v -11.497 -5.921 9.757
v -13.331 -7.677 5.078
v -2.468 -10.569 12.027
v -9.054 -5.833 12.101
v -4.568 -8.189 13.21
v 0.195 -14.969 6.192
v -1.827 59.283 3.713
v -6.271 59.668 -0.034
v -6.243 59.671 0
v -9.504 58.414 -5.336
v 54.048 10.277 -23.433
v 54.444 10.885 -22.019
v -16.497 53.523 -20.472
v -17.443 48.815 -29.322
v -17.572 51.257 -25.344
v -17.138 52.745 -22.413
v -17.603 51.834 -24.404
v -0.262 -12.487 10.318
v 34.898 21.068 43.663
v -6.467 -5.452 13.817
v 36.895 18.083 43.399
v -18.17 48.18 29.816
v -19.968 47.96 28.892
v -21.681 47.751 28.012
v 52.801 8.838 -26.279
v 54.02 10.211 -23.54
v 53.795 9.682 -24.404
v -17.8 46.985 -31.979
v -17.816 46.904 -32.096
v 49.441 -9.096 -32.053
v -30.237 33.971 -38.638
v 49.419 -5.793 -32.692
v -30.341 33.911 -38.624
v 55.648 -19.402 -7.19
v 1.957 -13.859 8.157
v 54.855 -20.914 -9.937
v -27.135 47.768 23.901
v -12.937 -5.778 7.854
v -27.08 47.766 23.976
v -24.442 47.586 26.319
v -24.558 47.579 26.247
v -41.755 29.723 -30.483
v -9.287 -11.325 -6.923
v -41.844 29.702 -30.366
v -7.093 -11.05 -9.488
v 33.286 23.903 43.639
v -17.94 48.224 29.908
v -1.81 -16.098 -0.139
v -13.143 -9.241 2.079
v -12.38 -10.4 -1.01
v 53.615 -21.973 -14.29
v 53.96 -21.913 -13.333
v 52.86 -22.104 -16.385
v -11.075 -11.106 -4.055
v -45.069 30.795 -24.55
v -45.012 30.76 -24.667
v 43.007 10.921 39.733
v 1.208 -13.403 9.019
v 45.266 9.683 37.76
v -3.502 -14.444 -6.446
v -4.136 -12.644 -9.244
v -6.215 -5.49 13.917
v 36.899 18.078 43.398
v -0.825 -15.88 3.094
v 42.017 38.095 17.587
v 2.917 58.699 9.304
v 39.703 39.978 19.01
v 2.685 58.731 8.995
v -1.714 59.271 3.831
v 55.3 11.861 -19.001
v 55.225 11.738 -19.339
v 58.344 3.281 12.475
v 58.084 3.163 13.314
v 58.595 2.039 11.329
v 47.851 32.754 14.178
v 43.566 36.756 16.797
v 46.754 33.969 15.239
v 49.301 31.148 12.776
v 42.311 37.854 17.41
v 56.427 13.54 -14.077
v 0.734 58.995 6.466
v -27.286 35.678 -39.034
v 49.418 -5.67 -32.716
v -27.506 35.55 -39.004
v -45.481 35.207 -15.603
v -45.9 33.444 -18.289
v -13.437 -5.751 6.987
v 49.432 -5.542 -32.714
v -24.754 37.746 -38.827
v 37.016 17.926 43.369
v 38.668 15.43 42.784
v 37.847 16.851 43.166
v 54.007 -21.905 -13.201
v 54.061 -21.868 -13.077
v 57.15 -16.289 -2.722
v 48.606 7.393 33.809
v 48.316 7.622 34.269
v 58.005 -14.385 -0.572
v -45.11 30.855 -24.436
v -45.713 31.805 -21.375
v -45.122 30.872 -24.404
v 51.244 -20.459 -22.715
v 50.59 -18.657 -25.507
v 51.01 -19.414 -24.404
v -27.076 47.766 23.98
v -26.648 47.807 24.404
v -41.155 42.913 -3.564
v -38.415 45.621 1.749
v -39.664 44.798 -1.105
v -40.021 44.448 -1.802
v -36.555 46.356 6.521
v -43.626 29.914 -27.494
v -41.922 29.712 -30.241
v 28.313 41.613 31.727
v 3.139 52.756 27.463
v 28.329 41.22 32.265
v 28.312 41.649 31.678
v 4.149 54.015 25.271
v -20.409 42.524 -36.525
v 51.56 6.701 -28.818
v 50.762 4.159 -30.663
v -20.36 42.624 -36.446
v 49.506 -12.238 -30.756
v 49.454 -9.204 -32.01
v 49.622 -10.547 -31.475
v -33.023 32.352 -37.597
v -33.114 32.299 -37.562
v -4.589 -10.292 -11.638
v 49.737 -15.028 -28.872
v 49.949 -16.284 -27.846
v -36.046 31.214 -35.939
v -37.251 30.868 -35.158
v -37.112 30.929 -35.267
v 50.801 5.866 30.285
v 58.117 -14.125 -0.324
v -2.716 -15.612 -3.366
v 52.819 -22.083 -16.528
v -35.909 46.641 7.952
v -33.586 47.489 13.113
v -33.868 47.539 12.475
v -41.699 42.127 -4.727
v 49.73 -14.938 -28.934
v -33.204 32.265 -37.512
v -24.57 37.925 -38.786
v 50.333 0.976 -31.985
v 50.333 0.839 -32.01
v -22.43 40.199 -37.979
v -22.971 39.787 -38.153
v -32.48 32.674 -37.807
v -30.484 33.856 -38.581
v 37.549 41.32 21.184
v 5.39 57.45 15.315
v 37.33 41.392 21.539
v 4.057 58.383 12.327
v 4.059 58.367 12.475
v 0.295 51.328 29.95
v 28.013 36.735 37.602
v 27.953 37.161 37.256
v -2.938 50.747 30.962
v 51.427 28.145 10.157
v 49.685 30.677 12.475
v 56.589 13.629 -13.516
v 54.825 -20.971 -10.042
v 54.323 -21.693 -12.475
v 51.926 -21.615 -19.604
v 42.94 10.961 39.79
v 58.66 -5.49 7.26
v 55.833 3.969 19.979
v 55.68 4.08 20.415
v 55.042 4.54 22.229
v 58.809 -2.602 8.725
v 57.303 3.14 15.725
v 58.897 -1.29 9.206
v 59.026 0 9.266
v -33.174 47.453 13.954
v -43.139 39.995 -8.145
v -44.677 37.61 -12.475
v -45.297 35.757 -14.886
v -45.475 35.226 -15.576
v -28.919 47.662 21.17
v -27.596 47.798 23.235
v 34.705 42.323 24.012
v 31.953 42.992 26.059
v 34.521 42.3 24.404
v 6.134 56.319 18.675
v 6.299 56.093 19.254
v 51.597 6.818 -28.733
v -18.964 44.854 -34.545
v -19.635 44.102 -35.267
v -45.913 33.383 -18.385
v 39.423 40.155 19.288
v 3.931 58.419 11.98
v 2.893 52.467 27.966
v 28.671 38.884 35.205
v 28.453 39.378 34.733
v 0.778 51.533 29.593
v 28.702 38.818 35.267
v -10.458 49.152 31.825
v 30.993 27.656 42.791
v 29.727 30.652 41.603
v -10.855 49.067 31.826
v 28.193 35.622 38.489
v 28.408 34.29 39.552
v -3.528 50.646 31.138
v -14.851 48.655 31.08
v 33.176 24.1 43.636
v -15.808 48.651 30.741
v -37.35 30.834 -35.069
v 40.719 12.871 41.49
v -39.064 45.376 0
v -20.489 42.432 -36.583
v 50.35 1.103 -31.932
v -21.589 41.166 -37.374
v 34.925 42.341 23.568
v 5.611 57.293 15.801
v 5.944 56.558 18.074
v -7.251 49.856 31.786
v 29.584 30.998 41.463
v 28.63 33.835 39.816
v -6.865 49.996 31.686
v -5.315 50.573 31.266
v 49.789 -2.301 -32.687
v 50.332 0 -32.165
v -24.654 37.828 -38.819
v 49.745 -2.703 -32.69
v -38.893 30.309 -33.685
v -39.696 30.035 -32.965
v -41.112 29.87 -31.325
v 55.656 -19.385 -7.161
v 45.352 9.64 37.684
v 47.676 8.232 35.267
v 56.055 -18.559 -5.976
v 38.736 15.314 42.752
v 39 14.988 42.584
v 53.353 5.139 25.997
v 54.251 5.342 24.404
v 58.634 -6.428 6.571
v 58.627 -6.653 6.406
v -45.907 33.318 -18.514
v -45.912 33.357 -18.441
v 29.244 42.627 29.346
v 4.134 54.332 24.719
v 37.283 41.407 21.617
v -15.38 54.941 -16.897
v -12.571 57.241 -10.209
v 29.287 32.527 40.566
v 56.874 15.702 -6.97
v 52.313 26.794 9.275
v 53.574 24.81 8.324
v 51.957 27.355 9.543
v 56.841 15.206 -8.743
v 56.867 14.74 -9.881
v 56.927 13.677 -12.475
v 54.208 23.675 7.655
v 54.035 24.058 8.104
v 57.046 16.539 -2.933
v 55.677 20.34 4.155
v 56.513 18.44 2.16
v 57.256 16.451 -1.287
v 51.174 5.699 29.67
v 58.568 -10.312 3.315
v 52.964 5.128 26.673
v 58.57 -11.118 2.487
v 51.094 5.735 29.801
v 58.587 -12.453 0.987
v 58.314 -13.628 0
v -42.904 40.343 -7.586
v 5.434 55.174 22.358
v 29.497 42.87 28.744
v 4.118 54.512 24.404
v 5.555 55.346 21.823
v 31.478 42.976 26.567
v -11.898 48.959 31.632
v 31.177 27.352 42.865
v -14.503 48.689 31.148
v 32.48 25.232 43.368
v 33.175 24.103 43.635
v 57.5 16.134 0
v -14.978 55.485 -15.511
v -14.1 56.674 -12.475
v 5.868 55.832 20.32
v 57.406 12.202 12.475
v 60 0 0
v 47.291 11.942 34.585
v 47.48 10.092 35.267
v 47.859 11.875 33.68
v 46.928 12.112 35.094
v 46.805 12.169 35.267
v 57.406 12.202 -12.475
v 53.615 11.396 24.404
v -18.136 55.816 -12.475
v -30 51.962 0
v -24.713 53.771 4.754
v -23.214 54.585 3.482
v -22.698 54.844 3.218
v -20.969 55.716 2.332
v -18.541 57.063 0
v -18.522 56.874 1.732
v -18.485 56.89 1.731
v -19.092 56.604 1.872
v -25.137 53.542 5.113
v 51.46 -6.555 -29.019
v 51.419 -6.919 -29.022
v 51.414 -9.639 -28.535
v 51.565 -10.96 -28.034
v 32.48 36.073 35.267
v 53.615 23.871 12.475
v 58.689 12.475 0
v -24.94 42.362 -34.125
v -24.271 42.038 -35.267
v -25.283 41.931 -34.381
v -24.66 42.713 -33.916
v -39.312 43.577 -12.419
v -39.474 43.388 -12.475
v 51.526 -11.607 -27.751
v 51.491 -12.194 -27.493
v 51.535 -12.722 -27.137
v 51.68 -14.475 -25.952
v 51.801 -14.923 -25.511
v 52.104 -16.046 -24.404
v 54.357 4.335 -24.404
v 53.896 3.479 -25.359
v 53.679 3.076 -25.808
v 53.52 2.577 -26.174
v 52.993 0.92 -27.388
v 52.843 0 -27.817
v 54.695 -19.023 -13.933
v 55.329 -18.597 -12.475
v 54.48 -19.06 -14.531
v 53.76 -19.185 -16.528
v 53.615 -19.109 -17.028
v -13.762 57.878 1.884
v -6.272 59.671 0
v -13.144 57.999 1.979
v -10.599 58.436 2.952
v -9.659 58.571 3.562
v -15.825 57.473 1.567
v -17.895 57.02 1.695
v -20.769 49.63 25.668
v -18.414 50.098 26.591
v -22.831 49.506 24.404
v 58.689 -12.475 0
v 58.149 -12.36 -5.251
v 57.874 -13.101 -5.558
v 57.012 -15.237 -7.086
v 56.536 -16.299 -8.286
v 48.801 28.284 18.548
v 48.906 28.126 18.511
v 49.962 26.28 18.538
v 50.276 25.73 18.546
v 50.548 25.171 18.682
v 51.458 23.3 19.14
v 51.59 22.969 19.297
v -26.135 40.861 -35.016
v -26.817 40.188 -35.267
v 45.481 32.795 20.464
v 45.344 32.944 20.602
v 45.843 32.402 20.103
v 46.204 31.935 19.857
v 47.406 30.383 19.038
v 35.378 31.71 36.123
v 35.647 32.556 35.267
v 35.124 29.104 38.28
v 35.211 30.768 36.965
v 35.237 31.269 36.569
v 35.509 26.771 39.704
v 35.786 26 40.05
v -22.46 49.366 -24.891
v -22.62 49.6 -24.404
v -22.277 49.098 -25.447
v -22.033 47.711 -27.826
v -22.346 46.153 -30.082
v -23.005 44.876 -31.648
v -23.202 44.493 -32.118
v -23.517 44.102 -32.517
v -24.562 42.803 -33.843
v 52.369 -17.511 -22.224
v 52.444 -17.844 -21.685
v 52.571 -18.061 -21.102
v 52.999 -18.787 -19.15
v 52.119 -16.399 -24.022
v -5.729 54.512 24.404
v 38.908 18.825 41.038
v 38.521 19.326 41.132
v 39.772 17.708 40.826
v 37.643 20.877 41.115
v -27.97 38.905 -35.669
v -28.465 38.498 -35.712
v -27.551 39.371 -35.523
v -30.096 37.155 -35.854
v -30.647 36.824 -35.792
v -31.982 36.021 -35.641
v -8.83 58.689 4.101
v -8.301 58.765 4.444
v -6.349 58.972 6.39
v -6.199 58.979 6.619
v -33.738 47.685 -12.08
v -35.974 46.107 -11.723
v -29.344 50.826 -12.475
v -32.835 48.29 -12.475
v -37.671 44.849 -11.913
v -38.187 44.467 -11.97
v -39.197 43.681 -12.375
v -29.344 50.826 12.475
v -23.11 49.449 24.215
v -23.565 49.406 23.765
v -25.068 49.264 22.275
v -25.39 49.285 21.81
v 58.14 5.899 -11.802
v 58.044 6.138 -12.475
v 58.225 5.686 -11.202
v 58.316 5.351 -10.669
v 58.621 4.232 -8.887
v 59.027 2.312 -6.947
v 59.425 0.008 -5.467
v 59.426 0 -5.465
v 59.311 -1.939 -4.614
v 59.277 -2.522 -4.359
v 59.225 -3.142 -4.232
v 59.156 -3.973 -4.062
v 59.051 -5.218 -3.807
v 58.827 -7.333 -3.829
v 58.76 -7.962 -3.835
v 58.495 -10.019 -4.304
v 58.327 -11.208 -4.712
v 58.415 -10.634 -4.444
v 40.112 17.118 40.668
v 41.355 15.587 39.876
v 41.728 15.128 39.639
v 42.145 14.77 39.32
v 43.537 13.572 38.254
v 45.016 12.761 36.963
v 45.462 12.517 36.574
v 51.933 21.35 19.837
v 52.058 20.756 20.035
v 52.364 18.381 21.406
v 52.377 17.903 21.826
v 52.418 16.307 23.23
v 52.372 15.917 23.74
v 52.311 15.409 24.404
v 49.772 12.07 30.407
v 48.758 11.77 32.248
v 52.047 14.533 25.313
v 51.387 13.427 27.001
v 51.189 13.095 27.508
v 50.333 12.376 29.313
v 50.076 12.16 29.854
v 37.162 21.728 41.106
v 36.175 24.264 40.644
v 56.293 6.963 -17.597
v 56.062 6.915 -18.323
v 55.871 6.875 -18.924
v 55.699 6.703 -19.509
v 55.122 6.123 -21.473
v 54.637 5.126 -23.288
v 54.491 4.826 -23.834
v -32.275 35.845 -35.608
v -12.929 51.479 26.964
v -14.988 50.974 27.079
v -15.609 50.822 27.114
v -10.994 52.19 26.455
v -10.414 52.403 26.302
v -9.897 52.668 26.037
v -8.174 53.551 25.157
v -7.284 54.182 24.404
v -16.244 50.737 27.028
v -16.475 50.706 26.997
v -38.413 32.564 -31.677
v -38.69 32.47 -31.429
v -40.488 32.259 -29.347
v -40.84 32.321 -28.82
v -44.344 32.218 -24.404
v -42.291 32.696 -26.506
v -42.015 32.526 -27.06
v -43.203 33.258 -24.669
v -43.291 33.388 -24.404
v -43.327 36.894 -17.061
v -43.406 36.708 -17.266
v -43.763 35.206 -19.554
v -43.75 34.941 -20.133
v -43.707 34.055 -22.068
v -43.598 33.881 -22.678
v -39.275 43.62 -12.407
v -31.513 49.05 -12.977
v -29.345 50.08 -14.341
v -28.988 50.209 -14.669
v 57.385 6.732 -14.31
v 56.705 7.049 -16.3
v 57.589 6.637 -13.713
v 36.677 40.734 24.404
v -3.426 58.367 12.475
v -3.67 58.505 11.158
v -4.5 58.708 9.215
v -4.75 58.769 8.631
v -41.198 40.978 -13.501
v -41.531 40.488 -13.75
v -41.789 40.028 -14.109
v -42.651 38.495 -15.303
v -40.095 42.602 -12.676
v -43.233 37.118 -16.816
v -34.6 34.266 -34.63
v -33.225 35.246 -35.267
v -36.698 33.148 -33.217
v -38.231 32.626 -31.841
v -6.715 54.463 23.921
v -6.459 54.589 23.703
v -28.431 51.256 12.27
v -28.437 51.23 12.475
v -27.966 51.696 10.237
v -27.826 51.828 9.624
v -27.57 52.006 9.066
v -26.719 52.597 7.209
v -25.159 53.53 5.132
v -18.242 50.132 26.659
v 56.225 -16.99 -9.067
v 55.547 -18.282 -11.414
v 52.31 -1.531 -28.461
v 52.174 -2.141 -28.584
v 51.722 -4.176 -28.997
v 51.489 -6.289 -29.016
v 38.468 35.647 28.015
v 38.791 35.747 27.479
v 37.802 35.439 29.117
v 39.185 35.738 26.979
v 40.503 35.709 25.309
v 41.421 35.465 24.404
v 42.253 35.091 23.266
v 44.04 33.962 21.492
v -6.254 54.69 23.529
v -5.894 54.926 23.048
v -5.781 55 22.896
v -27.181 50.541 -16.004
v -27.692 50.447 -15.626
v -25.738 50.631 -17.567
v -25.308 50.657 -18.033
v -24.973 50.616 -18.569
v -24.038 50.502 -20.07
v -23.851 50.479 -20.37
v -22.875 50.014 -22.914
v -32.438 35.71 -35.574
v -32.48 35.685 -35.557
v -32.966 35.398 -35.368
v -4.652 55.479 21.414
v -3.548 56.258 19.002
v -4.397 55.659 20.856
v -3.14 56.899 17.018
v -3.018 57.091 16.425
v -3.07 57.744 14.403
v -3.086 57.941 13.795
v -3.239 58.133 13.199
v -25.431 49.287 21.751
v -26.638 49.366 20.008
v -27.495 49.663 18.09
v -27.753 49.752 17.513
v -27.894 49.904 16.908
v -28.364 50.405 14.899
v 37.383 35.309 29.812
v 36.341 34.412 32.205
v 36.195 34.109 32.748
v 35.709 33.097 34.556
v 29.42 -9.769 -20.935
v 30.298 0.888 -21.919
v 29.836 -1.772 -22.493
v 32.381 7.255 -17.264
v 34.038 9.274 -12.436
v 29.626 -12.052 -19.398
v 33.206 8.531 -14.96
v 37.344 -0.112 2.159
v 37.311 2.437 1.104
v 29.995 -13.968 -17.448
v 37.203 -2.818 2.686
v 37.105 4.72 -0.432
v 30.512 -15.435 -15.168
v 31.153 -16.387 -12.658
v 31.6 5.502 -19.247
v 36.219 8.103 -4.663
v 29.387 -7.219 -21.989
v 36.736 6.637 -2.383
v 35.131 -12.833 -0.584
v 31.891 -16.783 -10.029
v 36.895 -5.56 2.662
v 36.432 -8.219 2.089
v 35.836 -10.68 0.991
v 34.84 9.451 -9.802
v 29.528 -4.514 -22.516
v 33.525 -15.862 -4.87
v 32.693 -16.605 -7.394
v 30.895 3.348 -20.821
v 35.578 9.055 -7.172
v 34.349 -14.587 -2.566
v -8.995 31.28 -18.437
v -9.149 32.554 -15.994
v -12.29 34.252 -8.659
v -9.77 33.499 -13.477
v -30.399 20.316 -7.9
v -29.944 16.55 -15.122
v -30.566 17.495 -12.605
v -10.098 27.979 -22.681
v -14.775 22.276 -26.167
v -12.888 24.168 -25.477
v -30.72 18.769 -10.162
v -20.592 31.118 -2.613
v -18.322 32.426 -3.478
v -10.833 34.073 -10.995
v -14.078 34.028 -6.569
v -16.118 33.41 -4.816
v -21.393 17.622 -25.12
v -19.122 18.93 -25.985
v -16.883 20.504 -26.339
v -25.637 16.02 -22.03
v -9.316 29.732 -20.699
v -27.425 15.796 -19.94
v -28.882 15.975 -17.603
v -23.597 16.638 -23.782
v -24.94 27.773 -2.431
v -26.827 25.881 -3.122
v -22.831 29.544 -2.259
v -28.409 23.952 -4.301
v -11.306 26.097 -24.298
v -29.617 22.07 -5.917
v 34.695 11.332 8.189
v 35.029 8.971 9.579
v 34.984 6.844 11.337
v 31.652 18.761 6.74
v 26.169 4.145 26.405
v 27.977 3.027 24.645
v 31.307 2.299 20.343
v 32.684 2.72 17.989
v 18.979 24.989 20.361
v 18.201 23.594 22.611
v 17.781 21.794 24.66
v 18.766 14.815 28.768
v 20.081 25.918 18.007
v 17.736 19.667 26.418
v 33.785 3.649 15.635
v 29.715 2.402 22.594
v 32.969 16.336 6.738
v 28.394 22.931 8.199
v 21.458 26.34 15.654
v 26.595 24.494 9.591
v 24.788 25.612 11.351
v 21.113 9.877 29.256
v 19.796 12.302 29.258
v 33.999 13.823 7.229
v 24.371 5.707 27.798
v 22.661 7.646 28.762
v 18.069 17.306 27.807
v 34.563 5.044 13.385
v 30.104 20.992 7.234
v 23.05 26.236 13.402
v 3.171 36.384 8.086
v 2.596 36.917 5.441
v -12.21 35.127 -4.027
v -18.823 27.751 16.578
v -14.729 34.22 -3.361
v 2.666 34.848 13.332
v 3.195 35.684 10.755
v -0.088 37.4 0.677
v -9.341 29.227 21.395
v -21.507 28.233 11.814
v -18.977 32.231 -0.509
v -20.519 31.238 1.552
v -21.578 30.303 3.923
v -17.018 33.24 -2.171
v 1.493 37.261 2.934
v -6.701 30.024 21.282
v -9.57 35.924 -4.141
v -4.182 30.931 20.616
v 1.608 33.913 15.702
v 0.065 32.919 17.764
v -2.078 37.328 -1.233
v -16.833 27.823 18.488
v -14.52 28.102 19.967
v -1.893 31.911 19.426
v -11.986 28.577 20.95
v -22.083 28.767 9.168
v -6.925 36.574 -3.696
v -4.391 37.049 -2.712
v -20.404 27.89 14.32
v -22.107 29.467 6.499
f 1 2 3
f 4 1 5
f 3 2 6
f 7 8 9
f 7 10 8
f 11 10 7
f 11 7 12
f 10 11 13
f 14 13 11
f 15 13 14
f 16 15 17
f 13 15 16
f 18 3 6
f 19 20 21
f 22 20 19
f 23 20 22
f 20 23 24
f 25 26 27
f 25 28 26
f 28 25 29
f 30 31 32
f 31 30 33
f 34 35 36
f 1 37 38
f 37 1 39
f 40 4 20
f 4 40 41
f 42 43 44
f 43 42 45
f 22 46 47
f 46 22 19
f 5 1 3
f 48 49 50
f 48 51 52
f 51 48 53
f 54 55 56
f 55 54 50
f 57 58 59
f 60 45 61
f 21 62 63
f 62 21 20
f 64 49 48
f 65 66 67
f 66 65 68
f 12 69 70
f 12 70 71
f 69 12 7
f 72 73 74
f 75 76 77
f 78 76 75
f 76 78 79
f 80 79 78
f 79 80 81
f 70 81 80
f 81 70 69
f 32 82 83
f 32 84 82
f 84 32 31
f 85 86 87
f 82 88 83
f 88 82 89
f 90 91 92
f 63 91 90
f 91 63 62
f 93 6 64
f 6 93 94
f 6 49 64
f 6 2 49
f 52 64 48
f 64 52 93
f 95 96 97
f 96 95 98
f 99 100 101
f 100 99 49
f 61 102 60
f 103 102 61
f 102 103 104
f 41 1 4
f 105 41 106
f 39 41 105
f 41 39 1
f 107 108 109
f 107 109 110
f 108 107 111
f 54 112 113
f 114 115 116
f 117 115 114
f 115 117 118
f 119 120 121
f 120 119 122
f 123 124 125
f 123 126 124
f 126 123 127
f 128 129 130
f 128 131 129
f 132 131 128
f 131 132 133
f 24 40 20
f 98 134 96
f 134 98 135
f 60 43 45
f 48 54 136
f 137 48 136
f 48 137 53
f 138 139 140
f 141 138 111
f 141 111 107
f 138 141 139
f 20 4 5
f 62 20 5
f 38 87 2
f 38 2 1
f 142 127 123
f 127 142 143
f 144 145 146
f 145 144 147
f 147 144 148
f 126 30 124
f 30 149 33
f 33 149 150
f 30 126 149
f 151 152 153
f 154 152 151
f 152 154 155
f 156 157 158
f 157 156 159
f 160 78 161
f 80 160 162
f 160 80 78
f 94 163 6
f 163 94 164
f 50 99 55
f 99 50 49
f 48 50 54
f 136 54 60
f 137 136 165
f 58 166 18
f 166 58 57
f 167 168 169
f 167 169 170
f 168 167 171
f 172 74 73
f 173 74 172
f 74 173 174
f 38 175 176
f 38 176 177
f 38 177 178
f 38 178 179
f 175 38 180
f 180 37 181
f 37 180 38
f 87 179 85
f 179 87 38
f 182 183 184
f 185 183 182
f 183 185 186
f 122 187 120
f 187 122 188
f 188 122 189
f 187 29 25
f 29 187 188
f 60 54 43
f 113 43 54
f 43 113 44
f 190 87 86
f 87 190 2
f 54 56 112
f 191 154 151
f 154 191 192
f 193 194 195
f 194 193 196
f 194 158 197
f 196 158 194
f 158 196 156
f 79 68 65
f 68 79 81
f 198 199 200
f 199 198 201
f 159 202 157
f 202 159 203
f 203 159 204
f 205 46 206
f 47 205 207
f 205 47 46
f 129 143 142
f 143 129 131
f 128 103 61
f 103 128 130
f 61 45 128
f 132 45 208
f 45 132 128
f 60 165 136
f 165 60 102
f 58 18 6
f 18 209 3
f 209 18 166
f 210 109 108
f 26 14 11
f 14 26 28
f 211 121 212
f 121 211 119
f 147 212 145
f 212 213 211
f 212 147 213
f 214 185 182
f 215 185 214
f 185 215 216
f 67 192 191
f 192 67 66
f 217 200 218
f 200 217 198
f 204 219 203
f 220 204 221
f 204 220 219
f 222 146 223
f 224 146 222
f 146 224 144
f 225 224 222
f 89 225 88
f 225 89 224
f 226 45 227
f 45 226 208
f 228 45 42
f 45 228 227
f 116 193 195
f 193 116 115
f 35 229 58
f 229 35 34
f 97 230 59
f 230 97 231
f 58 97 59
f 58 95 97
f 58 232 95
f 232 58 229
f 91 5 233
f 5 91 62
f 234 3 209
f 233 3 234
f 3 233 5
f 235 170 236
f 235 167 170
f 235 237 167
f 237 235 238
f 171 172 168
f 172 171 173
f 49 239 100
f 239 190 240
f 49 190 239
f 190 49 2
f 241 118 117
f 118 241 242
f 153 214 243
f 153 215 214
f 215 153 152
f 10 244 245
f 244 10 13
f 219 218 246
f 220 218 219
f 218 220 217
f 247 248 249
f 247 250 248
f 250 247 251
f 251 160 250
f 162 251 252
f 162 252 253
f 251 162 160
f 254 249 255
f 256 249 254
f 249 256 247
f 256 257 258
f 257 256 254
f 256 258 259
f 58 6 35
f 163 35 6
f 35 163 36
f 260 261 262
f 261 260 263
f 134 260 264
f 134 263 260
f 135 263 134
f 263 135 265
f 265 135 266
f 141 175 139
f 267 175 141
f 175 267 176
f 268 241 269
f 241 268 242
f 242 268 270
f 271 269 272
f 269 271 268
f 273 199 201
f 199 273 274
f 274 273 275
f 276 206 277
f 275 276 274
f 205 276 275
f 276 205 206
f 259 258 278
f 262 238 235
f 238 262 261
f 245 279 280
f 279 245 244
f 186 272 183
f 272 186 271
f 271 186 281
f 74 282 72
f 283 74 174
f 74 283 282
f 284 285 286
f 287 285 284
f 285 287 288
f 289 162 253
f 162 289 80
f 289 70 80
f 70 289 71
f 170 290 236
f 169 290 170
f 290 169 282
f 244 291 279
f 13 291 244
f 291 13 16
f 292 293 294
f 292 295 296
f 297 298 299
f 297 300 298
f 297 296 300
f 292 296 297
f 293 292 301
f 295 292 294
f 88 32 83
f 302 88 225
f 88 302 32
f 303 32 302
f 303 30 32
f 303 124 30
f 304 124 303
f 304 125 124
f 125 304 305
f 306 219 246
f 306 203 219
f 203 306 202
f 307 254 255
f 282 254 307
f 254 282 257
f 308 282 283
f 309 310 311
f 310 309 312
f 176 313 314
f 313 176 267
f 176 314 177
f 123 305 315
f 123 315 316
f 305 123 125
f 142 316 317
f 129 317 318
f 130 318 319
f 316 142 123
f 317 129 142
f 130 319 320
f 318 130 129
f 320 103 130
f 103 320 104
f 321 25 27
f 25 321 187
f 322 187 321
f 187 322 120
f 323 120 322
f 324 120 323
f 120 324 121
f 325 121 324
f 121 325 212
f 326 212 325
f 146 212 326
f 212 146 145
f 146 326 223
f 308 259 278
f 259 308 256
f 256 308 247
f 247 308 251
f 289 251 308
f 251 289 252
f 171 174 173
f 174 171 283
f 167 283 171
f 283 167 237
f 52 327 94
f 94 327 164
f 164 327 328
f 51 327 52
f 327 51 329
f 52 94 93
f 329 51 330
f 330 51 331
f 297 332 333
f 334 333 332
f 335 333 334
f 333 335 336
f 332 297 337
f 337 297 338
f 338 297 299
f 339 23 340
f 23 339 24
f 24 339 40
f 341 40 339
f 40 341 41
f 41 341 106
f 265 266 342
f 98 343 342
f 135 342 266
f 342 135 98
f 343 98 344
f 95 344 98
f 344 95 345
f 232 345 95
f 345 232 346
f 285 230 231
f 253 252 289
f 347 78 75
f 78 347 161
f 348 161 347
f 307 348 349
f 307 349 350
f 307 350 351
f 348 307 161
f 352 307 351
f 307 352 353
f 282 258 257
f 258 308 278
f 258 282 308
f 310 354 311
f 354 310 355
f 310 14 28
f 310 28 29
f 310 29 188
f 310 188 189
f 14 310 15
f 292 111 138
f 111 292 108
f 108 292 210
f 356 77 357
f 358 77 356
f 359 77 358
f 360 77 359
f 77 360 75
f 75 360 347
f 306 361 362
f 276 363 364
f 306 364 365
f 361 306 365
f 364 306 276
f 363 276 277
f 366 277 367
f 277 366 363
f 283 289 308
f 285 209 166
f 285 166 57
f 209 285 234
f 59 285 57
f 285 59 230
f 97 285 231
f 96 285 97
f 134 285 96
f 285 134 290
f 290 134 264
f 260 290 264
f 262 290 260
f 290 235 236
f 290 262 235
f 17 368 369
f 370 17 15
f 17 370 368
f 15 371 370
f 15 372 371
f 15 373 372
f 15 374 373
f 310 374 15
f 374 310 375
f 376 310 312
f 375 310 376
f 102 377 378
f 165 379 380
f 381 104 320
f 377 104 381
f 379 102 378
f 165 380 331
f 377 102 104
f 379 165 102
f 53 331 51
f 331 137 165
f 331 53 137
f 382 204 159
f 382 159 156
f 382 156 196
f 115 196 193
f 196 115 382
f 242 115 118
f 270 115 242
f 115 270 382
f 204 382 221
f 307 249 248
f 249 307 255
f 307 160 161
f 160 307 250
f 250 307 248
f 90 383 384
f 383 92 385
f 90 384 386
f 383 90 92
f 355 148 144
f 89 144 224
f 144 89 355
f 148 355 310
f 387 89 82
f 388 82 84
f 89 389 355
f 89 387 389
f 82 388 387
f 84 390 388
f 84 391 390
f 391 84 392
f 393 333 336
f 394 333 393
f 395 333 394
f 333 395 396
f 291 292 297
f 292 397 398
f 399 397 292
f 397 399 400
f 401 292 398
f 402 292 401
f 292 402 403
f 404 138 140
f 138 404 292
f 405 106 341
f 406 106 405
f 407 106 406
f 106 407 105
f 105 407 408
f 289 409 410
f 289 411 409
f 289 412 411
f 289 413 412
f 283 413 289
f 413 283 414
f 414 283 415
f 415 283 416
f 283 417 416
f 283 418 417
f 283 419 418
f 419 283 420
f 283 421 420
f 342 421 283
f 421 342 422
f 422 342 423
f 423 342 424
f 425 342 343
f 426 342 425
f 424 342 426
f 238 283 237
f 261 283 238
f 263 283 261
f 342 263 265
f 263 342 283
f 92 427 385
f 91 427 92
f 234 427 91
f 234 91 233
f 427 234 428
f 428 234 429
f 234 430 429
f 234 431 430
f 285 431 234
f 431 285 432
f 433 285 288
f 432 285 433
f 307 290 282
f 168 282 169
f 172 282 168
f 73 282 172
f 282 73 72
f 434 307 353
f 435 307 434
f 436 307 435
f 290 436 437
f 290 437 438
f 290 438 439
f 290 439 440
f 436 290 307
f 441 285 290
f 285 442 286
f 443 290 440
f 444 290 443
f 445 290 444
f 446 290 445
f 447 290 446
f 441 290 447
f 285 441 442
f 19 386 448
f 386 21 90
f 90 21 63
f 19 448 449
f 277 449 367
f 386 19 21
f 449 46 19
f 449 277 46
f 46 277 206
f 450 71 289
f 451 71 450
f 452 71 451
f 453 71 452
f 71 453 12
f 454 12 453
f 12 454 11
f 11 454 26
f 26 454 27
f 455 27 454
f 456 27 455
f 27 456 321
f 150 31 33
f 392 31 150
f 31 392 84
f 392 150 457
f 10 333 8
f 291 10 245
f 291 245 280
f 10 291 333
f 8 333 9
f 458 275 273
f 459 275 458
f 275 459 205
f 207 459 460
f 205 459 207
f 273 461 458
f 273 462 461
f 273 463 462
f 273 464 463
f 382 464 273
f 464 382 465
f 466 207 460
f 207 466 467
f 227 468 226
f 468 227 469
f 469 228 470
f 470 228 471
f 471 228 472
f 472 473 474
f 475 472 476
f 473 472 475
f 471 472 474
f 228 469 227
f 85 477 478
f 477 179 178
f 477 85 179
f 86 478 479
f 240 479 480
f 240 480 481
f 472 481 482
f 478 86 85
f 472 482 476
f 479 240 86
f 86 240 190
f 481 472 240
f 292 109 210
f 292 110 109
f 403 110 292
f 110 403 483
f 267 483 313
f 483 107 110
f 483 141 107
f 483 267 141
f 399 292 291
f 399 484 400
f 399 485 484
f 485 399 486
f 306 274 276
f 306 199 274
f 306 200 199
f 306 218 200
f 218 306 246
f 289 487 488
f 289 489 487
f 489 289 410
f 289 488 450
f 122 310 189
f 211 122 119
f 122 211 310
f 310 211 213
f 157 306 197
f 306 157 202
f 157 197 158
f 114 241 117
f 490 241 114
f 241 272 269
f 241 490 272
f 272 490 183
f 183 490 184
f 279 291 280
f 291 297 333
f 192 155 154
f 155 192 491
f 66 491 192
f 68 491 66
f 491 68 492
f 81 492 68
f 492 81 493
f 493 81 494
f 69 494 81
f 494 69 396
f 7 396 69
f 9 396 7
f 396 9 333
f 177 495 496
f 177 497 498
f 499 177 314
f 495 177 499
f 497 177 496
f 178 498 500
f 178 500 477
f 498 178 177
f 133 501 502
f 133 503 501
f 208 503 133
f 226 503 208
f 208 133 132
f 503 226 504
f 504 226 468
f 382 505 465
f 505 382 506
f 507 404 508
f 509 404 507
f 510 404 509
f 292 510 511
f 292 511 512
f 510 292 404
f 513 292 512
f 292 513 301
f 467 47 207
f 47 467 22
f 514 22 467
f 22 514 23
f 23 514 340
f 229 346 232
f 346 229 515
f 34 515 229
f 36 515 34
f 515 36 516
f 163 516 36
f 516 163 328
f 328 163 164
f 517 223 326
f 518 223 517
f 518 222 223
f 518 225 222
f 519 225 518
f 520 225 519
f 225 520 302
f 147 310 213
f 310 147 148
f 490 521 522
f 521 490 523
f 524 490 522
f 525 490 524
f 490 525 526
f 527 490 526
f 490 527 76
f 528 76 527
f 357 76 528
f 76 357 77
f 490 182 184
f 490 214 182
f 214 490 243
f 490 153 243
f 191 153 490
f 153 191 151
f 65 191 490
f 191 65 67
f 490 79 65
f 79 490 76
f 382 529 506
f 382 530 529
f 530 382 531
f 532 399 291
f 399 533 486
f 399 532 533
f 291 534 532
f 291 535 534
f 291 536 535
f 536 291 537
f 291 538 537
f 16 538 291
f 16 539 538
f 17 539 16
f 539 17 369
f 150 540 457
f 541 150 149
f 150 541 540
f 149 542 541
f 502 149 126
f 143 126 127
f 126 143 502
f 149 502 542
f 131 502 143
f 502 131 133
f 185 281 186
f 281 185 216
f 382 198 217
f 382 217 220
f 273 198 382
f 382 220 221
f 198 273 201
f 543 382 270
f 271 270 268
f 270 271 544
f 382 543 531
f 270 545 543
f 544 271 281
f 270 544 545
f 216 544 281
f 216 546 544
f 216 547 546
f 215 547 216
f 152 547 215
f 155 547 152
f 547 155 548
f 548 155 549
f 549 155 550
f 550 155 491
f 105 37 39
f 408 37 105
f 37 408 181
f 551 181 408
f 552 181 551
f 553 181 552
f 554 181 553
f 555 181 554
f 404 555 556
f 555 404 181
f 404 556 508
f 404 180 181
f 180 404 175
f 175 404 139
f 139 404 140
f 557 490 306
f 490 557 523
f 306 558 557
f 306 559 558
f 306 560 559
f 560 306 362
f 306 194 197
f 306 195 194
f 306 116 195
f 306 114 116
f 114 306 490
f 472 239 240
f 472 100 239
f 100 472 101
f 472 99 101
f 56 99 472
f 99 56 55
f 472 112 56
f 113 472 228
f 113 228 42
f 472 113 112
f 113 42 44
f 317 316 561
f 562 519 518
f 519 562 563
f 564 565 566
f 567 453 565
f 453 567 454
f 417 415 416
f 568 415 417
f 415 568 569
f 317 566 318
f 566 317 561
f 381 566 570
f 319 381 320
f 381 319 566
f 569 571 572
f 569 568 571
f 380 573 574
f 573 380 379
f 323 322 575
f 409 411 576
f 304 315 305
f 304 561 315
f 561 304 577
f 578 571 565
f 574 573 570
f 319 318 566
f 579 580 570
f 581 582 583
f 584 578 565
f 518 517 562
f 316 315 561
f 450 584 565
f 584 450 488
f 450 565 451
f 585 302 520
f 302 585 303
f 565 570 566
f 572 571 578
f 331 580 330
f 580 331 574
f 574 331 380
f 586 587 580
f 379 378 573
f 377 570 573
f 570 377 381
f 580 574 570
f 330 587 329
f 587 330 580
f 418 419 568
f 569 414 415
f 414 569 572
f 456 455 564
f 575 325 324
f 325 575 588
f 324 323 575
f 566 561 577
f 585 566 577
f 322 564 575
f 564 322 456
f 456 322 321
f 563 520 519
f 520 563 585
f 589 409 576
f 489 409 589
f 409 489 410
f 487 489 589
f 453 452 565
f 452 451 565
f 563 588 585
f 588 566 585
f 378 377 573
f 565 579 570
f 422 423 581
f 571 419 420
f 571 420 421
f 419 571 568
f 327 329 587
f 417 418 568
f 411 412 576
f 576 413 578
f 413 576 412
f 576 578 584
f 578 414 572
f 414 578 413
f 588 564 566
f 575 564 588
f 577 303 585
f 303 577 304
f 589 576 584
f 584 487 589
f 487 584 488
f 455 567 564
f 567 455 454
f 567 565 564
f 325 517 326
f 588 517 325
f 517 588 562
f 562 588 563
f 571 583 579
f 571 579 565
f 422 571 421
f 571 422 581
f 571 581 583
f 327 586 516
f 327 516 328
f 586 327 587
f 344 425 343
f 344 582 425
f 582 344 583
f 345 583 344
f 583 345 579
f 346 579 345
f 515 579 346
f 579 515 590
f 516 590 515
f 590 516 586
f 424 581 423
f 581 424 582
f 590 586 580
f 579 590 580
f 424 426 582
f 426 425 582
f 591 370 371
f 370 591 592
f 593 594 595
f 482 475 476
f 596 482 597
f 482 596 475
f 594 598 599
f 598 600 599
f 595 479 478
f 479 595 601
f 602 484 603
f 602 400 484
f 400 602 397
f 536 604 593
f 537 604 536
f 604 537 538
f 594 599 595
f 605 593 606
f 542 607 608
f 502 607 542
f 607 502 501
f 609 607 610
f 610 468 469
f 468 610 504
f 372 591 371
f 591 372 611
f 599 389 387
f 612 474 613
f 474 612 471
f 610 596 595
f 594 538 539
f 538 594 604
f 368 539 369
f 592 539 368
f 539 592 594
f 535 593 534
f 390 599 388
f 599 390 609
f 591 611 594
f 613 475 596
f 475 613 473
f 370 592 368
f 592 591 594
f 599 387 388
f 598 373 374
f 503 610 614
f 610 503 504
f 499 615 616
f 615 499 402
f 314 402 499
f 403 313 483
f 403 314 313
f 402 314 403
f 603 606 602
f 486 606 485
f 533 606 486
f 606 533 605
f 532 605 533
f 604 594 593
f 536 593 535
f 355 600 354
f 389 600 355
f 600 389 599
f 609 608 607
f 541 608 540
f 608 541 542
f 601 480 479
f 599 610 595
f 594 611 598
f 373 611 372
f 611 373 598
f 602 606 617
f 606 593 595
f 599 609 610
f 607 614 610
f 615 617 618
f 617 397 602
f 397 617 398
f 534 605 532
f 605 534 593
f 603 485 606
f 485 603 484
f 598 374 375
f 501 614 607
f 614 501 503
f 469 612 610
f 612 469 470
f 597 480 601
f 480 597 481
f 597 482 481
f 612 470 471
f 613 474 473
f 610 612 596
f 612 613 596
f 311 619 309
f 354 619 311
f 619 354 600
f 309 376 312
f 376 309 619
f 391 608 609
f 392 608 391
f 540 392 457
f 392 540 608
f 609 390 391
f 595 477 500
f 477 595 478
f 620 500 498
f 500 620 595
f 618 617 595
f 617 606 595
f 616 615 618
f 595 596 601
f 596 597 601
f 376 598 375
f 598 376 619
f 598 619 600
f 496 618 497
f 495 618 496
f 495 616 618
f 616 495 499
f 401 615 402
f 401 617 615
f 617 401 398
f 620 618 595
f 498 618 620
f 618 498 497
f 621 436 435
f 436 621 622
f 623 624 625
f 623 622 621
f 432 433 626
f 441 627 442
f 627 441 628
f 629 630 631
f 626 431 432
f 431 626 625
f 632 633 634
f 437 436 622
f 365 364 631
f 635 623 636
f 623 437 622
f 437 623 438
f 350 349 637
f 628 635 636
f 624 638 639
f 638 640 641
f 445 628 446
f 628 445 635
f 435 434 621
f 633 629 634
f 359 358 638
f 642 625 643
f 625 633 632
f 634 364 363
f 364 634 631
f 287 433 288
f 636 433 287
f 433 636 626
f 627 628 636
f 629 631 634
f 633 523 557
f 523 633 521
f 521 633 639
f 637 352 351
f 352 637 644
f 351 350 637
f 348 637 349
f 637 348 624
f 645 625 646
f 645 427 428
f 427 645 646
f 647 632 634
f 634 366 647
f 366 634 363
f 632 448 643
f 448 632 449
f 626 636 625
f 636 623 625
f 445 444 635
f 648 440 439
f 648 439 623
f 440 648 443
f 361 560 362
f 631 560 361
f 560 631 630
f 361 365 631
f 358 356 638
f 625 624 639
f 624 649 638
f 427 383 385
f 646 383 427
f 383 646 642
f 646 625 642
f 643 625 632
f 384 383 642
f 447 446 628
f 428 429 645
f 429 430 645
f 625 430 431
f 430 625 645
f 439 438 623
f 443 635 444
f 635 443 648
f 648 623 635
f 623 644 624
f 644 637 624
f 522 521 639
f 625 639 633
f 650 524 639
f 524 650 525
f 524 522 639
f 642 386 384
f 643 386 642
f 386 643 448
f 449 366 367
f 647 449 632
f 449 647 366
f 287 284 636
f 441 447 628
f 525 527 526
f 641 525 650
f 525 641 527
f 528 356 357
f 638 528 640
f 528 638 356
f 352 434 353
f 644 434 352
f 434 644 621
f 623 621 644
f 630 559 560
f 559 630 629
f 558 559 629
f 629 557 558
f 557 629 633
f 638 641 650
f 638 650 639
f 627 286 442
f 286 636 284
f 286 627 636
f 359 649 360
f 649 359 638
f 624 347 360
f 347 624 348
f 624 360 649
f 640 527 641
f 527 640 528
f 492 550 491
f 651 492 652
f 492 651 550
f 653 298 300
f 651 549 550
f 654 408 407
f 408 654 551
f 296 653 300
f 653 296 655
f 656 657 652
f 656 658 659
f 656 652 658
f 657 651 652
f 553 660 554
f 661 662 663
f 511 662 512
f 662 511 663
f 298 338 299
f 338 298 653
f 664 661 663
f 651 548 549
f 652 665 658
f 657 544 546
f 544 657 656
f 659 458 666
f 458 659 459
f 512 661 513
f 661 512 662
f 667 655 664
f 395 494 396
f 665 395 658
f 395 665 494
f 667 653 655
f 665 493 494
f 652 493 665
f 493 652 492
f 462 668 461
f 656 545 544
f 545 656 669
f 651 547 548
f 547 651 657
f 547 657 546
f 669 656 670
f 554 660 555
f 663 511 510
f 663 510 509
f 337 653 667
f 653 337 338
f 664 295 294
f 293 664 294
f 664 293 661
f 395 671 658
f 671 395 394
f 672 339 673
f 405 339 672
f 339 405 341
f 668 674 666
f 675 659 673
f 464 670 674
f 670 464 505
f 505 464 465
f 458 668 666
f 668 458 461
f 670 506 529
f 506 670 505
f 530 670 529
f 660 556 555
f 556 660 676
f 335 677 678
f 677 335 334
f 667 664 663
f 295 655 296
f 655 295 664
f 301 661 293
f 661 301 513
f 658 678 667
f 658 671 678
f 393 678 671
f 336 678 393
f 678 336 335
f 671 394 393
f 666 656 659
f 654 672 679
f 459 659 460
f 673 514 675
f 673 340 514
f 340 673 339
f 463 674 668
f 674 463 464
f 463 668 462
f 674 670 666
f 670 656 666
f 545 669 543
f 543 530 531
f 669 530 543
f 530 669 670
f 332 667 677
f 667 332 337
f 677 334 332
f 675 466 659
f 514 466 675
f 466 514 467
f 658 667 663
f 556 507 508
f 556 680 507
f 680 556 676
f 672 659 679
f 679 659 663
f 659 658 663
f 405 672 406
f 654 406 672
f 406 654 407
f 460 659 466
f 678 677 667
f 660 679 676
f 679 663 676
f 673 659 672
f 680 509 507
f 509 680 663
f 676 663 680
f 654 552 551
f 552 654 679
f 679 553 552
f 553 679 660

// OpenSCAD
difference() {
	intersection() {
		hull() {
			rotate(a = -44.0760747966, v = [0.6353131492, -0.2832921829, 0.0000000000]) {
				rotate(a = -90.0000000000, v = [-0.0000000000, -1.0000000000, 0.0000000000]) {
					cylinder(h = 60, r = 16.2000000000);
				}
			}
			rotate(a = -44.0760747966, v = [0.6353131492, -0.2832921829, 0.0000000000]) {
				rotate(a = -90.0000000000, v = [0.8660254038, 0.5000000000, -0.0000000000]) {
					cylinder(h = 60, r = 16.2000000000);
				}
			}
			rotate(a = -44.0760747966, v = [0.6353131492, -0.2832921829, 0.0000000000]) {
				rotate(a = -32.5529951665, v = [-0.0926239006, -0.5300474731, 0.0000000000]) {
					cylinder(h = 60, r = 16.2000000000);
				}
			}
			rotate(a = -44.0760747966, v = [0.6353131492, -0.2832921829, 0.0000000000]) {
				rotate(a = -46.2229214243, v = [0.5838132168, 0.4248525055, -0.0000000000]) {
					cylinder(h = 60, r = 16.2000000000);
				}
			}
		}
		sphere(r = 60);
	}
	union() {
		rotate(a = -44.0760747966, v = [0.6353131492, -0.2832921829, 0.0000000000]) {
			rotate(a = -90.0000000000, v = [-0.0000000000, -1.0000000000, 0.0000000000]) {
				translate(v = [0, 0, 35]) {
					cylinder(h = 100, r = 13.2000000000);
				}
			}
		}
		rotate(a = -44.0760747966, v = [0.6353131492, -0.2832921829, 0.0000000000]) {
			rotate(a = -90.0000000000, v = [0.8660254038, 0.5000000000, -0.0000000000]) {
				translate(v = [0, 0, 35]) {
					cylinder(h = 100, r = 13.2000000000);
				}
			}
		}
		rotate(a = -44.0760747966, v = [0.6353131492, -0.2832921829, 0.0000000000]) {
			rotate(a = -32.5529951665, v = [-0.0926239006, -0.5300474731, 0.0000000000]) {
				translate(v = [0, 0, 35]) {
					cylinder(h = 100, r = 13.2000000000);
				}
			}
		}
		rotate(a = -44.0760747966, v = [0.6353131492, -0.2832921829, 0.0000000000]) {
			rotate(a = -46.2229214243, v = [0.5838132168, 0.4248525055, -0.0000000000]) {
				translate(v = [0, 0, 35]) {
					cylinder(h = 100, r = 13.2000000000);
				}
			}
		}
	}
}
